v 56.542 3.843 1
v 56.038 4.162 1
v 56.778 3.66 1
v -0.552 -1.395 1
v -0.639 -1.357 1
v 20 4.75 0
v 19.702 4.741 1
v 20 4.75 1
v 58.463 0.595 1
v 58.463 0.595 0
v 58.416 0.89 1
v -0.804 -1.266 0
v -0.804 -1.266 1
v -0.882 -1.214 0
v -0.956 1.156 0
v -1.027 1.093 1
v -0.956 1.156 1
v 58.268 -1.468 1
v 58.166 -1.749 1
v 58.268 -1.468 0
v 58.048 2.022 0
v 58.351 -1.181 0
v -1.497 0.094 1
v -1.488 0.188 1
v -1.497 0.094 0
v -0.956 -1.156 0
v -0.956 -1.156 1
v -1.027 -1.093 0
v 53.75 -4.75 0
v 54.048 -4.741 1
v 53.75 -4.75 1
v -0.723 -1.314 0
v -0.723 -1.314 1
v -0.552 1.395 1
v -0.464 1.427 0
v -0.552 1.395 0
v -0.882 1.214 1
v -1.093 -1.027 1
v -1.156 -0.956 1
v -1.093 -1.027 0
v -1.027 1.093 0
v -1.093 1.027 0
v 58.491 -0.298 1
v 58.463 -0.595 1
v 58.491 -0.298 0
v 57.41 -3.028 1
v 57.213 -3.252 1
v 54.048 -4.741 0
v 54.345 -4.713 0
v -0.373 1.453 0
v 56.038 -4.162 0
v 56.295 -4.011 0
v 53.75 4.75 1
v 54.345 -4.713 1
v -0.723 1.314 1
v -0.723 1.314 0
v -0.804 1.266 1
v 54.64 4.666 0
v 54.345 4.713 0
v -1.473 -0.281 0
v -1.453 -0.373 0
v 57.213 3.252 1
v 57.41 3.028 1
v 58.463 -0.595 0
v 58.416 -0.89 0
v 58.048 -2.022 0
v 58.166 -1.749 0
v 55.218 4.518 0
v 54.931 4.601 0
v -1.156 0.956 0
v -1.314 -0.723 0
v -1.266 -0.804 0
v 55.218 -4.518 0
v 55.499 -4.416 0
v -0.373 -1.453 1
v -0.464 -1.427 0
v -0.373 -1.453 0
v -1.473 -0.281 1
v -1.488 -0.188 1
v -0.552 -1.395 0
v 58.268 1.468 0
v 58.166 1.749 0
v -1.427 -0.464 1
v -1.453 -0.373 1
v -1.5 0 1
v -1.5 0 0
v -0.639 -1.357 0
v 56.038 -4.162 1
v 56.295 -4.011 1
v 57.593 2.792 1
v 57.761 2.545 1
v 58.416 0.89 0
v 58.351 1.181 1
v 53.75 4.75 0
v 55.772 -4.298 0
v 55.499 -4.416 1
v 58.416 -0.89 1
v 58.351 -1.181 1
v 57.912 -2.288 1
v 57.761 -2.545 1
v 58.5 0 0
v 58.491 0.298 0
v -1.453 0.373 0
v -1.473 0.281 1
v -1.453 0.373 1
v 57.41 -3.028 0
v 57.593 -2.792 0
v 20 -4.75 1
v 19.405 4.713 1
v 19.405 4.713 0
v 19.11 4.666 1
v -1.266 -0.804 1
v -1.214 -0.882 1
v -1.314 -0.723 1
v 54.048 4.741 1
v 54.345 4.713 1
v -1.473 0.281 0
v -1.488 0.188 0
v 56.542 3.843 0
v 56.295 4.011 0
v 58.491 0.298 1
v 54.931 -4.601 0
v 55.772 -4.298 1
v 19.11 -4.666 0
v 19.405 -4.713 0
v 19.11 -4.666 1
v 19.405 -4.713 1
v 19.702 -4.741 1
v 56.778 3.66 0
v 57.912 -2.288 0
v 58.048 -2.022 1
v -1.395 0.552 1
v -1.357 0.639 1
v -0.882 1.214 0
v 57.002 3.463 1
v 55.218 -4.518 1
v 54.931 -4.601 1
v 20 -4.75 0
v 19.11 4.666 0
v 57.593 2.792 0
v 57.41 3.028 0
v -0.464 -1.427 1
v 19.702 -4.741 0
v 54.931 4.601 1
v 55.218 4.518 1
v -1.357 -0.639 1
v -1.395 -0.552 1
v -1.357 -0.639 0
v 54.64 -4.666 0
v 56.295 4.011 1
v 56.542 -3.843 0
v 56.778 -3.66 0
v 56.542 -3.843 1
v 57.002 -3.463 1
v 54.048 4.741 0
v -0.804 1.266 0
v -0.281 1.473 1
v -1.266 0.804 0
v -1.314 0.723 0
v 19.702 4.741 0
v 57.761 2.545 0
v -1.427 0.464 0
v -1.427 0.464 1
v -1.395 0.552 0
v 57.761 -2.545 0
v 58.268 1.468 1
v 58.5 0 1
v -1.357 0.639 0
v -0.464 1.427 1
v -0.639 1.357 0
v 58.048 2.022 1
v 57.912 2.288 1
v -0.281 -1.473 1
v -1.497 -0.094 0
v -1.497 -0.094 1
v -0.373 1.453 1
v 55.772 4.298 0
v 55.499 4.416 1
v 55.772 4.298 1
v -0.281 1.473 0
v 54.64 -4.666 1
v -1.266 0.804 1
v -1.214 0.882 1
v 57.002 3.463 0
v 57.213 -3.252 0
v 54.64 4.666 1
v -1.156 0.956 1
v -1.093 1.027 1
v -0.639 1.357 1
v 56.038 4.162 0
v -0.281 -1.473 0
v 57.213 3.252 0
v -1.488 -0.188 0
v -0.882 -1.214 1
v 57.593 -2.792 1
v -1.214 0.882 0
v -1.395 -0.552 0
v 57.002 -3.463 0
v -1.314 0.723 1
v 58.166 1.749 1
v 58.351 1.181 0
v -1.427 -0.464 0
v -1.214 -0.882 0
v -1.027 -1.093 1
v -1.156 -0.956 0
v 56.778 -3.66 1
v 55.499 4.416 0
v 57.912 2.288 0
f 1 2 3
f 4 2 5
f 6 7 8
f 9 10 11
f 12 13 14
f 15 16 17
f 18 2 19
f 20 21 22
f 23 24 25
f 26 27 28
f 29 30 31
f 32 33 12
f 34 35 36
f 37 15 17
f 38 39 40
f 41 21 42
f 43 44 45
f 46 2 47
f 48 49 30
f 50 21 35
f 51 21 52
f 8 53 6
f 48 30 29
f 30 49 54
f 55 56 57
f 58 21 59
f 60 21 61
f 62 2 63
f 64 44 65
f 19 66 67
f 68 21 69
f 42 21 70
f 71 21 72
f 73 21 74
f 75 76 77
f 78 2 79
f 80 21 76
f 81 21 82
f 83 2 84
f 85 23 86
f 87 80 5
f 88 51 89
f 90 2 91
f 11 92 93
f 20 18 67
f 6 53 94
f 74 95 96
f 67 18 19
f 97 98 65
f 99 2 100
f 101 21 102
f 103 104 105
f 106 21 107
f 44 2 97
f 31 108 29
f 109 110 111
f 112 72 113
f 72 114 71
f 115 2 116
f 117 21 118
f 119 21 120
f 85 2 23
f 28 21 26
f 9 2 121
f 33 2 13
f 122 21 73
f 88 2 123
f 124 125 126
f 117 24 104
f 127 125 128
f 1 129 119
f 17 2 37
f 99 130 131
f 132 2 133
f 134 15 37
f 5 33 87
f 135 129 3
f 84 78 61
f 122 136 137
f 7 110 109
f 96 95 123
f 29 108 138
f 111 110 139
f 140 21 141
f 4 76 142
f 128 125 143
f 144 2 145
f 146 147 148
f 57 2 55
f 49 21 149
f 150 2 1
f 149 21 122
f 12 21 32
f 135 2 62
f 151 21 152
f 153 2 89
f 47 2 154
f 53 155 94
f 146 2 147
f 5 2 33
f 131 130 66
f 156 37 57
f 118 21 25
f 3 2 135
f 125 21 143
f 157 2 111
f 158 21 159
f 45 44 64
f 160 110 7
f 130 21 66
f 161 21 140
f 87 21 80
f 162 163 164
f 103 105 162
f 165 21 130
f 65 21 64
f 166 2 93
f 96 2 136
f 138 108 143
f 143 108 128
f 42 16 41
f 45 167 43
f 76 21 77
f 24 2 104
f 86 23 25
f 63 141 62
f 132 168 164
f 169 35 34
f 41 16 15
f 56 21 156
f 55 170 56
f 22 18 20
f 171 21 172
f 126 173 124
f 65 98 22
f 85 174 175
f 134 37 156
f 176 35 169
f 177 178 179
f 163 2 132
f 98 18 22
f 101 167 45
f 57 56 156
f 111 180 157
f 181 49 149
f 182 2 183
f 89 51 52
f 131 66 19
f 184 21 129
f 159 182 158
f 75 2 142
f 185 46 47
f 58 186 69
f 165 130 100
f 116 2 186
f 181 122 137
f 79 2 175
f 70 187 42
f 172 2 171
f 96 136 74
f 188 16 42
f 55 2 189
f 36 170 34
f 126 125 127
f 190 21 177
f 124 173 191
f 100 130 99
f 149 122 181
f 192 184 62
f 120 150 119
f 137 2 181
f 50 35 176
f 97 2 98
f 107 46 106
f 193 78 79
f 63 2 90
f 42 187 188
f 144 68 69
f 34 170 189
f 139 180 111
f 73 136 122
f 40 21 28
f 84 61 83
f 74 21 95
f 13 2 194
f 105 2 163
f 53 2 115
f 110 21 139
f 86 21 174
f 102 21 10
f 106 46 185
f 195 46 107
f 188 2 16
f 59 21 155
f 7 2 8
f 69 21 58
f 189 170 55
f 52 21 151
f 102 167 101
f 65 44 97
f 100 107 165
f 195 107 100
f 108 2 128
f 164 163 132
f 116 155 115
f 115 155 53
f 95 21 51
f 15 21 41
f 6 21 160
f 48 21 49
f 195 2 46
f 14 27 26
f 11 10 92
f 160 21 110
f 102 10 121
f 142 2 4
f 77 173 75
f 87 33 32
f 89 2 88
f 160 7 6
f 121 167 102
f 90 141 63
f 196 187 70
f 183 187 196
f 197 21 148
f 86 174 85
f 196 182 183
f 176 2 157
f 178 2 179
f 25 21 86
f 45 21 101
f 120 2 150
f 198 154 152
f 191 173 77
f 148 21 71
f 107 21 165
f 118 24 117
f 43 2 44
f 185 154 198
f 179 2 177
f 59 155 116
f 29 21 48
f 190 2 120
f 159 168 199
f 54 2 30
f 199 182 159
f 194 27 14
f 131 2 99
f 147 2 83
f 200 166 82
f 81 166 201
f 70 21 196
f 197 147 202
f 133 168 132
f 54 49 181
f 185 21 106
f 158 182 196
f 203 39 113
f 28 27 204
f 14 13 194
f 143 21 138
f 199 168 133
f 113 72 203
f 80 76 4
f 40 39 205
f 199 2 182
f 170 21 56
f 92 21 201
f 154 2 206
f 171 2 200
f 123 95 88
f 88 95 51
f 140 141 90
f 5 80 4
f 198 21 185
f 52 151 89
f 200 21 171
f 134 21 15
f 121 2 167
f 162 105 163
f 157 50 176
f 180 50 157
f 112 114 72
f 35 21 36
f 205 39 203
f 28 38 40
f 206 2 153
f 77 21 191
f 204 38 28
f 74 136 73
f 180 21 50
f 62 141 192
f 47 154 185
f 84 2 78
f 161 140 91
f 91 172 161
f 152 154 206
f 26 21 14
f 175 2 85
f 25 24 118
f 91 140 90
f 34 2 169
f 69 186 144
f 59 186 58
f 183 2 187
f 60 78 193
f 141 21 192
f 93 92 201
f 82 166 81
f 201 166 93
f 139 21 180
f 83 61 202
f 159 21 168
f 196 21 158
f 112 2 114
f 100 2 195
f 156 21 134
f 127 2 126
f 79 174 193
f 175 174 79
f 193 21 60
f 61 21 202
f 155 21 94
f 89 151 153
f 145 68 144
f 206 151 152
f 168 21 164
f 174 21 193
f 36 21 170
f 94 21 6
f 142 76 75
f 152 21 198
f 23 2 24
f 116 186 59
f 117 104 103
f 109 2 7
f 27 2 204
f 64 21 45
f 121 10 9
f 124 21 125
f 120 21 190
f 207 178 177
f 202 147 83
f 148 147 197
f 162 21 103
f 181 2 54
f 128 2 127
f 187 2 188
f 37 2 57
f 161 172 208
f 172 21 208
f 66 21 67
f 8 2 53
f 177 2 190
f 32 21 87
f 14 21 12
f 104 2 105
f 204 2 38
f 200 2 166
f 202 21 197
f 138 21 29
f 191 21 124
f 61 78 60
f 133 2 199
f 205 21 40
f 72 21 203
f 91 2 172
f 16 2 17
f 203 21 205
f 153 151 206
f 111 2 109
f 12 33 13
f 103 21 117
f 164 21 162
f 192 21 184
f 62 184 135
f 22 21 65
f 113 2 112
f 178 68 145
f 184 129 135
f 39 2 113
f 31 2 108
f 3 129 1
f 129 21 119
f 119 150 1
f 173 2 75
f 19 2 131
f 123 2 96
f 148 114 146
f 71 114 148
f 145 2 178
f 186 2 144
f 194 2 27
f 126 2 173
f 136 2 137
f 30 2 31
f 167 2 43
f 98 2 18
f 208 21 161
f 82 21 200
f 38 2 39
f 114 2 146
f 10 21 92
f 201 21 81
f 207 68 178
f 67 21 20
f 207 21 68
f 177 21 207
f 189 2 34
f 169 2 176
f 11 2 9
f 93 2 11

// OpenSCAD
// length is the main customizable thing
length = 60;

// you can also customize these
thickness = 1;
width = 9.5;

// and these if you'd like
tip_r = 1.5;
taper_len = 20;

$fn=100;

hull() {
    cylinder(h=thickness, r=tip_r);
    translate([taper_len, 0, 0])
    cylinder(h=thickness, r=width / 2);
    translate([length - tip_r - width / 2, 0, 0])
    cylinder(h=thickness, r=width / 2);
}
